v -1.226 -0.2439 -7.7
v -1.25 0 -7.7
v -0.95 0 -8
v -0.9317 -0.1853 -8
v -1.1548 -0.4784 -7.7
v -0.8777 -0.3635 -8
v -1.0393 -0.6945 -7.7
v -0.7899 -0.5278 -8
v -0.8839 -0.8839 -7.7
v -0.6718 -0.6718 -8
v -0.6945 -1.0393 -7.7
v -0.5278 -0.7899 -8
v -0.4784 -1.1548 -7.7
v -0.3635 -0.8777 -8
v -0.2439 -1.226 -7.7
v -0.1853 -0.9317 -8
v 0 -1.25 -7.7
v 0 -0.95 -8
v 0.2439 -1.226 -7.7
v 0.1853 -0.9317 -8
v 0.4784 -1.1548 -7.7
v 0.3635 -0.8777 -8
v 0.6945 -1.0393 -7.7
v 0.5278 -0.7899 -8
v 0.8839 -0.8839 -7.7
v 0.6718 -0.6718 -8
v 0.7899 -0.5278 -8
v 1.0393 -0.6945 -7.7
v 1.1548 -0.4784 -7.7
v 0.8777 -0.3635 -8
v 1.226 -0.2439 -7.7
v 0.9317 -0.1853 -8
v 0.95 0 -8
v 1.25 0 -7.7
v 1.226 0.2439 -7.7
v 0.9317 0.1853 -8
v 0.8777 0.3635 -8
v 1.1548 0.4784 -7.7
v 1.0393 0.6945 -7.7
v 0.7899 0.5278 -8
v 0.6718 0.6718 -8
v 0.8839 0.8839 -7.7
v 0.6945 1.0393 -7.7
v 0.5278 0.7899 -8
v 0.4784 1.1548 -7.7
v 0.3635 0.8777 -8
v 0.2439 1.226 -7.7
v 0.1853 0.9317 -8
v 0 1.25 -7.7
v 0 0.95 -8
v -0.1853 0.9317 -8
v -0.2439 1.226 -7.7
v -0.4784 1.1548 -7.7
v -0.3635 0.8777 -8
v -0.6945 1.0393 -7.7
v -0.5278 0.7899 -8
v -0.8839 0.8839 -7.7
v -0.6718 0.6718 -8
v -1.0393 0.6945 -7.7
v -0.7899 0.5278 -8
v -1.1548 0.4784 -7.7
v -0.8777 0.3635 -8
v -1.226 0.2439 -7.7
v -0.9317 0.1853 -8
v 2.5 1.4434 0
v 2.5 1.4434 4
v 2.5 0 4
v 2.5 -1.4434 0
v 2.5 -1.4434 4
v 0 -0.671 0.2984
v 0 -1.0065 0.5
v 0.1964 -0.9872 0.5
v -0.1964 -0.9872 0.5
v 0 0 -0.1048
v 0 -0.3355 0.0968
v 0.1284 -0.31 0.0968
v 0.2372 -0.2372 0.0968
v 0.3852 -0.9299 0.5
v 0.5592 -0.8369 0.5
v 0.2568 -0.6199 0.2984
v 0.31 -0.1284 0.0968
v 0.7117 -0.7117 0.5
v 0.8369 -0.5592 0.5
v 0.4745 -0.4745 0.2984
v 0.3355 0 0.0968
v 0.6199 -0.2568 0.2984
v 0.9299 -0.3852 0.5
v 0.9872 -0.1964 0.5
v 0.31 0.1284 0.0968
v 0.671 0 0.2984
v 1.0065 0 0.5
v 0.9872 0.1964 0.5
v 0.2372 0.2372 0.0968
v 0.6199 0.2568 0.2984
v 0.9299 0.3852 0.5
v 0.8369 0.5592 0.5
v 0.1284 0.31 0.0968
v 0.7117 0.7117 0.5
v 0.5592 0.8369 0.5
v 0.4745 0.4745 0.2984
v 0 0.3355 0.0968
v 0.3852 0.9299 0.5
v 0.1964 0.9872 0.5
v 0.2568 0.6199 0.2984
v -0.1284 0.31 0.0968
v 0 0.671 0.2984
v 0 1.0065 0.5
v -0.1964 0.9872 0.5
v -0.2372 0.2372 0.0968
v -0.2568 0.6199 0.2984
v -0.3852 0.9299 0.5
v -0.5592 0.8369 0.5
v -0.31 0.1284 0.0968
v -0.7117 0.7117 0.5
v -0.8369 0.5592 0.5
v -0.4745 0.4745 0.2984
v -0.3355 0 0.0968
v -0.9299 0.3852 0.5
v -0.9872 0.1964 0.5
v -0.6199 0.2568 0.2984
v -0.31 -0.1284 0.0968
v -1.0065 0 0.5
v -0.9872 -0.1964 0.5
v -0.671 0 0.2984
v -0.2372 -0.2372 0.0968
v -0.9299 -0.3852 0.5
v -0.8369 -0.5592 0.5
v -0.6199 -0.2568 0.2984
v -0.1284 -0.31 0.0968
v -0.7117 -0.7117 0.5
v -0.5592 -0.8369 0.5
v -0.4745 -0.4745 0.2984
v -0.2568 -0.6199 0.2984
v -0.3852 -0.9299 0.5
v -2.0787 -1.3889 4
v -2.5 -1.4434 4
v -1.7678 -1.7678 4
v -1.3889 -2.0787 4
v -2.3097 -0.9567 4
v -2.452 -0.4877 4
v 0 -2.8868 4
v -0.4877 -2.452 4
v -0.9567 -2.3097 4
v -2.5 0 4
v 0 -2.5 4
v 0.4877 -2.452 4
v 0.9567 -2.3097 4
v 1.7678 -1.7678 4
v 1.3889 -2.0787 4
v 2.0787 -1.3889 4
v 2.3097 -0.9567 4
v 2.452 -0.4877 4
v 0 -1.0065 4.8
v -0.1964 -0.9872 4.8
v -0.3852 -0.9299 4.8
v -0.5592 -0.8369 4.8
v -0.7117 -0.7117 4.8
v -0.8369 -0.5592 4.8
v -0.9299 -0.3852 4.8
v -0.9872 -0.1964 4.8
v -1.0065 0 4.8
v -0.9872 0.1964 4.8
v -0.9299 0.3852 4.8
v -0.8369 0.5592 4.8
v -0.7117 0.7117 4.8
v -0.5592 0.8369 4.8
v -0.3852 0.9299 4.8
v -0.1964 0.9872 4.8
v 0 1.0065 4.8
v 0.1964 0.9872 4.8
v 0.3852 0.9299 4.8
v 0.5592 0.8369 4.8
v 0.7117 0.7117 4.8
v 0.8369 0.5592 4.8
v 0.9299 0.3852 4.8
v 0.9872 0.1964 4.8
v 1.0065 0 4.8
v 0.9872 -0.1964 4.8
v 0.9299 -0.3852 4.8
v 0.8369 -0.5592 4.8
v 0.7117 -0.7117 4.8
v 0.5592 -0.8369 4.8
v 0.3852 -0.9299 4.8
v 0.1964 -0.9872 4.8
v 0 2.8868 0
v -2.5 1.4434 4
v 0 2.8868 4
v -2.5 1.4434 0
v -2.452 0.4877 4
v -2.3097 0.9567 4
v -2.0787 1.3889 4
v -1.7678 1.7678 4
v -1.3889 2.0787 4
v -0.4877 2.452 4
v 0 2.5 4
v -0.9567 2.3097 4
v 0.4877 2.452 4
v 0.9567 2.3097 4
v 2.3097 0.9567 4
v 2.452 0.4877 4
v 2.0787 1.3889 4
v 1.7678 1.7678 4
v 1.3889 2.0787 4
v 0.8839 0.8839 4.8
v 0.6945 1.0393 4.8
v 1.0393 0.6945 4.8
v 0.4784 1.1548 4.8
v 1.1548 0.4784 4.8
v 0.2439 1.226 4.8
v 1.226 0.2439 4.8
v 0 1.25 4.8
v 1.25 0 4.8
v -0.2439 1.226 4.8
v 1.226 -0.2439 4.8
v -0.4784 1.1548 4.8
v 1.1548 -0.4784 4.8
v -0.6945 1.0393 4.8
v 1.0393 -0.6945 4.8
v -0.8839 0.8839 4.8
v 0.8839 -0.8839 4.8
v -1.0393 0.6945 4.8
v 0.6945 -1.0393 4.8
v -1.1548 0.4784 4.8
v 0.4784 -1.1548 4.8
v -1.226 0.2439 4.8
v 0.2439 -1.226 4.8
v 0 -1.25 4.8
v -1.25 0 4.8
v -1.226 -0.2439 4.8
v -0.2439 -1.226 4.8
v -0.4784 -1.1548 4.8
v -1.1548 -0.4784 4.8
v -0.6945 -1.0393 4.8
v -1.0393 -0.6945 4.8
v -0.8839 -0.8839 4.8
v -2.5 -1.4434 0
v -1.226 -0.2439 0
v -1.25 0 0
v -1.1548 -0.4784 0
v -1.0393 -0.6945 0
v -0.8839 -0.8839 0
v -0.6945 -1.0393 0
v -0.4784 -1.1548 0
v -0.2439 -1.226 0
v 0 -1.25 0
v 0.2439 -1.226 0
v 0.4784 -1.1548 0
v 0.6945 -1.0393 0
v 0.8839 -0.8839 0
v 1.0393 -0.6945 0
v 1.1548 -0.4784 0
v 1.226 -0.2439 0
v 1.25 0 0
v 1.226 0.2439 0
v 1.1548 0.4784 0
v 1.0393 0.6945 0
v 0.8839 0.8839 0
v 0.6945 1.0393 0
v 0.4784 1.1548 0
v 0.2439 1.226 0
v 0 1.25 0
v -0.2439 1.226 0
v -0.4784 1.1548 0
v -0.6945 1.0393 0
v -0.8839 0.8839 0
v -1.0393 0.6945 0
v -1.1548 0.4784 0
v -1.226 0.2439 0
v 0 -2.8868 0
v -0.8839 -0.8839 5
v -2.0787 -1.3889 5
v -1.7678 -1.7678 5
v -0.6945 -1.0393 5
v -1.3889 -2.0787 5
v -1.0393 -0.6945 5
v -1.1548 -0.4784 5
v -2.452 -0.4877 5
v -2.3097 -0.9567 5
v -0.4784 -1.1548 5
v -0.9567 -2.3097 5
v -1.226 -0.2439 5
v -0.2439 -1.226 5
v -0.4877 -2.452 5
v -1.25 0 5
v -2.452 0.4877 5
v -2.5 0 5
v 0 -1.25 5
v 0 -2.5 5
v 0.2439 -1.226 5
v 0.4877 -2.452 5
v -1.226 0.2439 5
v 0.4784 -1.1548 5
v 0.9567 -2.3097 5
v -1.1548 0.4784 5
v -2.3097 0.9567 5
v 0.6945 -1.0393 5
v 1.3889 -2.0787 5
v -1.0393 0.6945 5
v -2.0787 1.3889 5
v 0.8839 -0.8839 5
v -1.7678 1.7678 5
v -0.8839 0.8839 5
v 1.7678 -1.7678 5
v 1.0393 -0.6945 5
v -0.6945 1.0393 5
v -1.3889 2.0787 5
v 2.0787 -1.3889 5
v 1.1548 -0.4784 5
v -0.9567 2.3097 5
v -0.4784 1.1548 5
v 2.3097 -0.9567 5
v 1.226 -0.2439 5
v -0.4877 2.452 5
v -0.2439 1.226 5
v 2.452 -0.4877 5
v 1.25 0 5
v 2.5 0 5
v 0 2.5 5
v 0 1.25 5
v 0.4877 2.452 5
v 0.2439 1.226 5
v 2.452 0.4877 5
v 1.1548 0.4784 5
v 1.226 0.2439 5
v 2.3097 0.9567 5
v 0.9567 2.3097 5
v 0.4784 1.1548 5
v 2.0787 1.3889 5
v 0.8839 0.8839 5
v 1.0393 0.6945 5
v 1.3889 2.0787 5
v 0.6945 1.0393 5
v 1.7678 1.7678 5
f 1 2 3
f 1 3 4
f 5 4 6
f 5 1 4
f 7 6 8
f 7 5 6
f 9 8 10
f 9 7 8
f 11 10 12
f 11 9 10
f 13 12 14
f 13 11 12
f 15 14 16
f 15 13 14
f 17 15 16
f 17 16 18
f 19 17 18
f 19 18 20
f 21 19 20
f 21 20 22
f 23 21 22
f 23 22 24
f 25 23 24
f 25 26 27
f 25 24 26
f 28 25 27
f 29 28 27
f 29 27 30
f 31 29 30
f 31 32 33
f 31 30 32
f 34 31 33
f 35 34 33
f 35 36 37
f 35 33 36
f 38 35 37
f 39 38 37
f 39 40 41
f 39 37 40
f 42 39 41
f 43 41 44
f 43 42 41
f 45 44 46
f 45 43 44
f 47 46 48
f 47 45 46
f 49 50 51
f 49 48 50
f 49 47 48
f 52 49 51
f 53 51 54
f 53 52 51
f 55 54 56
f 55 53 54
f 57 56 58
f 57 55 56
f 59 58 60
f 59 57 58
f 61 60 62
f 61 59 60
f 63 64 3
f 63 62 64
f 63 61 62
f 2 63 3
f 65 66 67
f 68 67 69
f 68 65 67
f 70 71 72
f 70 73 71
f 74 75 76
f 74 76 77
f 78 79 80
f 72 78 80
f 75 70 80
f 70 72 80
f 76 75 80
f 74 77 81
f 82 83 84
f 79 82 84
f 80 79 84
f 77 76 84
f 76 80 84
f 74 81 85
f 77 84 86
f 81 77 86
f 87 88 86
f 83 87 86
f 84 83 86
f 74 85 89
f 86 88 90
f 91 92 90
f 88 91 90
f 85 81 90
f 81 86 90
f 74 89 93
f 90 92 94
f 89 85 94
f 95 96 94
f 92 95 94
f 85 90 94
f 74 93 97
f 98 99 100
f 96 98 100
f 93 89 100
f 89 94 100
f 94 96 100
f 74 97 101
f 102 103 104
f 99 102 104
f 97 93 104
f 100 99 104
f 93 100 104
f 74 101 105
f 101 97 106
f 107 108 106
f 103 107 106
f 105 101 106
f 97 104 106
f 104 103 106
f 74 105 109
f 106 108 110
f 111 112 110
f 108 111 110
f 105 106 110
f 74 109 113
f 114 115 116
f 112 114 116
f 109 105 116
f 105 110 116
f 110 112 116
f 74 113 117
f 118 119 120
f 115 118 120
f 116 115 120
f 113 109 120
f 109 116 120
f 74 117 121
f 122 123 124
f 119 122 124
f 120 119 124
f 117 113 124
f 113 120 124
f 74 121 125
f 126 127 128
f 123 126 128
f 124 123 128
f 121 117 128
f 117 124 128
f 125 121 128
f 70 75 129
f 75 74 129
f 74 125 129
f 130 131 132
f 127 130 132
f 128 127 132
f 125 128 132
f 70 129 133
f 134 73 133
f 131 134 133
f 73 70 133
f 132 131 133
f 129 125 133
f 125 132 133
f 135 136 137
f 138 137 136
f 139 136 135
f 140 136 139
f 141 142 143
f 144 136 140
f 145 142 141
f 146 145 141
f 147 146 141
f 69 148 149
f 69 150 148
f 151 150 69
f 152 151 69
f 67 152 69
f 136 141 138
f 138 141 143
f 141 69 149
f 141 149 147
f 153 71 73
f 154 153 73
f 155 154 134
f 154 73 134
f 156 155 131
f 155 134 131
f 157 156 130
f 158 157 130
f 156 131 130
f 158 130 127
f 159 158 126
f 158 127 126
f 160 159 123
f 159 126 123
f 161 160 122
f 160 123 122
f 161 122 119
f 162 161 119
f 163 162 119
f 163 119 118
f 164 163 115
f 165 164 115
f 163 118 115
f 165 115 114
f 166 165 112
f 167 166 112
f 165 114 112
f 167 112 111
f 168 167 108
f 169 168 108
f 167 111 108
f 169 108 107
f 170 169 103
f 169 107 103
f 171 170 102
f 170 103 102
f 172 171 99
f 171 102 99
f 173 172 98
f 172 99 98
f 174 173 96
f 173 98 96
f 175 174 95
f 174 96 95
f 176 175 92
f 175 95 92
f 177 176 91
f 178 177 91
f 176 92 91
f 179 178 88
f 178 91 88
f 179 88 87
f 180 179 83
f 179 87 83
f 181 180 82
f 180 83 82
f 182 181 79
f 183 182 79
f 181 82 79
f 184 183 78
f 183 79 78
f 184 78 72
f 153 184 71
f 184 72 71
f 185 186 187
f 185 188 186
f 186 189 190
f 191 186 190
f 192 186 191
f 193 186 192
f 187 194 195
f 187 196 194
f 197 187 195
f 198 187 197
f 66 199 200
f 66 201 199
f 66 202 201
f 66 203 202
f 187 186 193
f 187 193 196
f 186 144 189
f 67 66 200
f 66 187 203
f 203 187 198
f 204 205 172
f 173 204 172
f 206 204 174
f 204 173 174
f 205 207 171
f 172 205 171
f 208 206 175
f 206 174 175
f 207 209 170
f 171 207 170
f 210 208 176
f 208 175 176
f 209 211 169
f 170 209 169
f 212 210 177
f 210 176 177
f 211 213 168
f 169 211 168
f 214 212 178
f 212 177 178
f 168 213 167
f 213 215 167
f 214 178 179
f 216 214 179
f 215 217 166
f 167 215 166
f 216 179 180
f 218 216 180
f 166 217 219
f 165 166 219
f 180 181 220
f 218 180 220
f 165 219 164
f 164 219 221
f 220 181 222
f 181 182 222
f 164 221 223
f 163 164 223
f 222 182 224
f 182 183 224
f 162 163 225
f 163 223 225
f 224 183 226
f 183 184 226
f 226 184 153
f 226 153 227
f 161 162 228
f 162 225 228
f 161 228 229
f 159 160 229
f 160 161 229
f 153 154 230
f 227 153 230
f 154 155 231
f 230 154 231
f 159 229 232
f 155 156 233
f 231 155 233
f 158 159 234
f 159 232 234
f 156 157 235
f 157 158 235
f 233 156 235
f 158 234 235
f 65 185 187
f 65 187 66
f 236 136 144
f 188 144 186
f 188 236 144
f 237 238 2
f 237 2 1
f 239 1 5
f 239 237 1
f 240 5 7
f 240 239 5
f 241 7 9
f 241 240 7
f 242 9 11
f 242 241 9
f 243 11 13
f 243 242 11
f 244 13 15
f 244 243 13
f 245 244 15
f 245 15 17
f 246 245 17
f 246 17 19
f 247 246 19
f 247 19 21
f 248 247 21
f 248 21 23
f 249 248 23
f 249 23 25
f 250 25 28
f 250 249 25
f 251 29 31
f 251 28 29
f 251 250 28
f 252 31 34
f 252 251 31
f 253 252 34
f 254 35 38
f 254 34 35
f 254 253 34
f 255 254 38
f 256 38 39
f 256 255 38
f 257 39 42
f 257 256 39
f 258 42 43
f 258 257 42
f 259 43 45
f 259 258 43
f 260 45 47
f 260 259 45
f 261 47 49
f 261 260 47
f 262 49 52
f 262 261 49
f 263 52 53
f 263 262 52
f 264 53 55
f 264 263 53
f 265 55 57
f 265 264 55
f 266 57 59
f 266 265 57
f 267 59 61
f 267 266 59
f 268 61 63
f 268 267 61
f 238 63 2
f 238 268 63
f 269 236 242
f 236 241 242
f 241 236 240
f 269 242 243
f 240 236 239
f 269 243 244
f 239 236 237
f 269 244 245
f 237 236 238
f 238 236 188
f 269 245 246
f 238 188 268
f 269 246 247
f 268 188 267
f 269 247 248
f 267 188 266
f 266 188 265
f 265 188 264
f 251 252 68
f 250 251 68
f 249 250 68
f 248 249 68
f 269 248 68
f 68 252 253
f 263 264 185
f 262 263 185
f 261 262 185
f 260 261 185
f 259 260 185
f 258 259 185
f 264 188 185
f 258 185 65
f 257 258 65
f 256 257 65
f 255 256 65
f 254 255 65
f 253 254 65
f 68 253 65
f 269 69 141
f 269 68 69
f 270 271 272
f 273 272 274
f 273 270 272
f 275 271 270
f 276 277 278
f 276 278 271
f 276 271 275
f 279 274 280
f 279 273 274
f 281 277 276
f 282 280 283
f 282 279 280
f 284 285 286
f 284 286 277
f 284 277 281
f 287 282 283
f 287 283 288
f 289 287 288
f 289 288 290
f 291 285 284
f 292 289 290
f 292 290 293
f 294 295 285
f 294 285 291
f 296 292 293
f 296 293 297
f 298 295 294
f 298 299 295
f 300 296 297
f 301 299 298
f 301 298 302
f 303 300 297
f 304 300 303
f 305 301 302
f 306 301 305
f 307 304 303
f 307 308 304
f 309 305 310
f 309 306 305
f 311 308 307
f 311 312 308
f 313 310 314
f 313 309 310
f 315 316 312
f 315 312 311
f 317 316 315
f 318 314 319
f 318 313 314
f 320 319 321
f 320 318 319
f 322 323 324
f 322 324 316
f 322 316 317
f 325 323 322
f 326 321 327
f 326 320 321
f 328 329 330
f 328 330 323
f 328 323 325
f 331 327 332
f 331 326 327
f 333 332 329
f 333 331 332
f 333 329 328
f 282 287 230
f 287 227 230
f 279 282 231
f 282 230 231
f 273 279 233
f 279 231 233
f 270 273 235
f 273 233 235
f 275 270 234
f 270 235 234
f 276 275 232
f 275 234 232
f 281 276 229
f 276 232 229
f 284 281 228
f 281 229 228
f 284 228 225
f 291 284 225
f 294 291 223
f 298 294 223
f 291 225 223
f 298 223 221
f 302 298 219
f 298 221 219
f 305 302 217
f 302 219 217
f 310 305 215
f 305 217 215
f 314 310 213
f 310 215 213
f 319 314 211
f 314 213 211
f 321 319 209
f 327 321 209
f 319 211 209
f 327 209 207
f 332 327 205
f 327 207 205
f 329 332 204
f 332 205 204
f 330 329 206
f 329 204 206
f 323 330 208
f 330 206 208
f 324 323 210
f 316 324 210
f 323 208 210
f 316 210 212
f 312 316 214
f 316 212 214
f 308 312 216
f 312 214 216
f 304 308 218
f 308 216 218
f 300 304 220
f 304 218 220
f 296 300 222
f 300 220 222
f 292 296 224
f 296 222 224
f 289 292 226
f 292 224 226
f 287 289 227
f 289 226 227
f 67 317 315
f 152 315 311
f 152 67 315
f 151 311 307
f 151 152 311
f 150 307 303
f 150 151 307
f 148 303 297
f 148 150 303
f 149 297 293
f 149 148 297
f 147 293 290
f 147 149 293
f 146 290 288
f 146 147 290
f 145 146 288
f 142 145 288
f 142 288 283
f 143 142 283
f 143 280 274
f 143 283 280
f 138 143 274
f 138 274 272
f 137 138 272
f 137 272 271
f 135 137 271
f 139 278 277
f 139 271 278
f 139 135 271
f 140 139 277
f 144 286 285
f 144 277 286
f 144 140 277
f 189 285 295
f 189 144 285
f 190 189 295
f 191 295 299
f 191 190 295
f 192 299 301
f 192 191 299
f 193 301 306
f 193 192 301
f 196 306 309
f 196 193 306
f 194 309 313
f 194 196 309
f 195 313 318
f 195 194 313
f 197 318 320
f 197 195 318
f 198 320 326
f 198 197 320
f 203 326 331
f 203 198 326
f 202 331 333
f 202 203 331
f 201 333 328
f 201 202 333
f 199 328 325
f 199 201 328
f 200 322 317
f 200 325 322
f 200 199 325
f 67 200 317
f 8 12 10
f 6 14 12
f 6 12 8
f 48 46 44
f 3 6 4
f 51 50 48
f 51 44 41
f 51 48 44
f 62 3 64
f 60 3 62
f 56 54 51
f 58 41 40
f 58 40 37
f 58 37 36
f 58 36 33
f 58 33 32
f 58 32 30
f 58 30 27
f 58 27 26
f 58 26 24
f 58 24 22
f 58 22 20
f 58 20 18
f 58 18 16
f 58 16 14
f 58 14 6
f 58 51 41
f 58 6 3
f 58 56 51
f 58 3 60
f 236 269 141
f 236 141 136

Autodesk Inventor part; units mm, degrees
ref_plane "YZ Plane" through (0, 0, 0) normal (1, 0, 0) x (0, 1, 0)
ref_plane "XZ Plane" through (0, 0, 0) normal (0, 1, 0) x (-1, 0, 0)
ref_plane "XY Plane" through (0, 0, 0) normal (0, 0, 1) x (1, 0, 0)
sketch "Skizze1" plane through (0, 0, 0) normal (0, 0, 1) x (1, 0, 0)
  line L0 (0, 2.8868) -> (2.5, 1.4434)
  line L1 (2.5, 1.4434) -> (2.5, -1.4434)
  line L2 (2.5, -1.4434) -> (0, -2.8868)
  line L3 (0, -2.8868) -> (-2.5, -1.4434)
  line L4 (-2.5, -1.4434) -> (-2.5, 1.4434)
  line L5 (-2.5, 1.4434) -> (0, 2.8868)
  point P0 (0, 0)
  point P1 (0, 0)
  dimension "d0" = 5
extrude "Extrusion1" add sketch "Skizze1" along normal blind 4
sketch "Skizze2" plane through (0, 0, 4) normal (0, 0, 1) x (1, 0, 0)
  circle A0 centre (0, 0) radius 2.5
  line L0 (2.5, -1.4434) -> (2.5, 1.4434) projected
extrude "Extrusion2" add sketch "Skizze2" along normal blind 1
sketch "Skizze3" plane through (0, 0, 0) normal (0, 0, -1) x (-1, 0, 0)
  circle A0 centre (0, 0) radius 1.25
  dimension "d6" = 2.5
extrude "Extrusion3" add sketch "Skizze3" along normal blind 8
thread "Gewinde1" size "M2.5x0.45" class "6g" standard "ANSI Metric M Profile" full length
chamfer "Fase1" distance 0.3 angle 45 1 edges at (1.25, 0, -8)
sketch "Skizze4" plane through (0, 0, 5) normal (0, 0, 1) x (1, 0, 0)
  point P0 (0, 0)
  point P1 (0, 0)
hole "Bohrung1" at (0, 0, 5) direction (0, 0, -1) diameter 2.013 depth 4.5 tip angle 118 counterbore diameter 2.5 counterbore depth 0.2 thread size "M2.5x0.45" class "6H" standard "ISO Metric profile"
properties part number "distanzhalter_schraube"
